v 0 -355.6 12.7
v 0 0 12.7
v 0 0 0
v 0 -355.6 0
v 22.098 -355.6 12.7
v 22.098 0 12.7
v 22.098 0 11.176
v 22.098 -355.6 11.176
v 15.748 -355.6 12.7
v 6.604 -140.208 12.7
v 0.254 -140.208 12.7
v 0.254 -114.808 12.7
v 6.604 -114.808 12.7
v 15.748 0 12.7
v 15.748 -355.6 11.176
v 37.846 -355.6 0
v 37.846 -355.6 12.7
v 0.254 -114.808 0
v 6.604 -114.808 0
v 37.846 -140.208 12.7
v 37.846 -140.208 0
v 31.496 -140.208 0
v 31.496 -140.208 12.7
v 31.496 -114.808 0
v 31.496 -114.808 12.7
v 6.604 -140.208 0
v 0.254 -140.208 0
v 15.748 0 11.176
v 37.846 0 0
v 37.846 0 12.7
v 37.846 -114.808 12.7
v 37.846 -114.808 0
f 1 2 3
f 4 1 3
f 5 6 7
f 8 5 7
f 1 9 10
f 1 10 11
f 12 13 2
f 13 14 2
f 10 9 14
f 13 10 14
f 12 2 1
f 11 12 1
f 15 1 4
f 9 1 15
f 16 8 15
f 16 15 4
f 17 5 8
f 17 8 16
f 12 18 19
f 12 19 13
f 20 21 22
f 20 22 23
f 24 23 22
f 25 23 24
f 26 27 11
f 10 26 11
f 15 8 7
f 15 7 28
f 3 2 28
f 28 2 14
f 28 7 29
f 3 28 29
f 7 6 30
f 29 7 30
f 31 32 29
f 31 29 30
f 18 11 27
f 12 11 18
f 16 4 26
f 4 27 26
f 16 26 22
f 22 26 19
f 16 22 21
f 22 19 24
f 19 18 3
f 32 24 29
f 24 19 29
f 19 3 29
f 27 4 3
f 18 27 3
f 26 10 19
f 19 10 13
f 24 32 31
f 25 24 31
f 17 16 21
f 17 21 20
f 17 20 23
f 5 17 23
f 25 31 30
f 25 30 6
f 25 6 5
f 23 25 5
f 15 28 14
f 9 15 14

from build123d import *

# Parameters (mm, degrees)
F1_DEPTH = 355.6
F2_W     = 25.4
F2_H     = 12.7
F3_DEPTH = 6.35


# Not quite as in the source:
# - a pattern or mirror of a feature is missing from the dataset's text; its kind, count and spacing are read off the source's solid


with BuildPart() as f1:
    # F0 (on Front) → F1 (new body)
    with BuildSketch(Plane.XZ):
        Polygon((15.748, 12.7), (0, 12.7), (0, 0), (37.846, 0), (37.846, 12.7), (22.098, 12.7), (22.098, 11.176), (15.748, 11.176), align=None)
    extrude(amount=F1_DEPTH)

    # F2 (on face) → F3 (cut)
    with BuildSketch(Plane.YZ.offset(37.846)):
        with Locations((-127.508, 6.35)):
            Rectangle(F2_W, F2_H)
    f3 = extrude(amount=-F3_DEPTH, mode=Mode.SUBTRACT)

    # F3_copies: F3 across plane
    add(f3.mirror(Plane(origin=(19.05, 0, 0), x_dir=(0, 0, -1), z_dir=(-1, 0, 0))), mode=Mode.SUBTRACT)


solid = f1.part
